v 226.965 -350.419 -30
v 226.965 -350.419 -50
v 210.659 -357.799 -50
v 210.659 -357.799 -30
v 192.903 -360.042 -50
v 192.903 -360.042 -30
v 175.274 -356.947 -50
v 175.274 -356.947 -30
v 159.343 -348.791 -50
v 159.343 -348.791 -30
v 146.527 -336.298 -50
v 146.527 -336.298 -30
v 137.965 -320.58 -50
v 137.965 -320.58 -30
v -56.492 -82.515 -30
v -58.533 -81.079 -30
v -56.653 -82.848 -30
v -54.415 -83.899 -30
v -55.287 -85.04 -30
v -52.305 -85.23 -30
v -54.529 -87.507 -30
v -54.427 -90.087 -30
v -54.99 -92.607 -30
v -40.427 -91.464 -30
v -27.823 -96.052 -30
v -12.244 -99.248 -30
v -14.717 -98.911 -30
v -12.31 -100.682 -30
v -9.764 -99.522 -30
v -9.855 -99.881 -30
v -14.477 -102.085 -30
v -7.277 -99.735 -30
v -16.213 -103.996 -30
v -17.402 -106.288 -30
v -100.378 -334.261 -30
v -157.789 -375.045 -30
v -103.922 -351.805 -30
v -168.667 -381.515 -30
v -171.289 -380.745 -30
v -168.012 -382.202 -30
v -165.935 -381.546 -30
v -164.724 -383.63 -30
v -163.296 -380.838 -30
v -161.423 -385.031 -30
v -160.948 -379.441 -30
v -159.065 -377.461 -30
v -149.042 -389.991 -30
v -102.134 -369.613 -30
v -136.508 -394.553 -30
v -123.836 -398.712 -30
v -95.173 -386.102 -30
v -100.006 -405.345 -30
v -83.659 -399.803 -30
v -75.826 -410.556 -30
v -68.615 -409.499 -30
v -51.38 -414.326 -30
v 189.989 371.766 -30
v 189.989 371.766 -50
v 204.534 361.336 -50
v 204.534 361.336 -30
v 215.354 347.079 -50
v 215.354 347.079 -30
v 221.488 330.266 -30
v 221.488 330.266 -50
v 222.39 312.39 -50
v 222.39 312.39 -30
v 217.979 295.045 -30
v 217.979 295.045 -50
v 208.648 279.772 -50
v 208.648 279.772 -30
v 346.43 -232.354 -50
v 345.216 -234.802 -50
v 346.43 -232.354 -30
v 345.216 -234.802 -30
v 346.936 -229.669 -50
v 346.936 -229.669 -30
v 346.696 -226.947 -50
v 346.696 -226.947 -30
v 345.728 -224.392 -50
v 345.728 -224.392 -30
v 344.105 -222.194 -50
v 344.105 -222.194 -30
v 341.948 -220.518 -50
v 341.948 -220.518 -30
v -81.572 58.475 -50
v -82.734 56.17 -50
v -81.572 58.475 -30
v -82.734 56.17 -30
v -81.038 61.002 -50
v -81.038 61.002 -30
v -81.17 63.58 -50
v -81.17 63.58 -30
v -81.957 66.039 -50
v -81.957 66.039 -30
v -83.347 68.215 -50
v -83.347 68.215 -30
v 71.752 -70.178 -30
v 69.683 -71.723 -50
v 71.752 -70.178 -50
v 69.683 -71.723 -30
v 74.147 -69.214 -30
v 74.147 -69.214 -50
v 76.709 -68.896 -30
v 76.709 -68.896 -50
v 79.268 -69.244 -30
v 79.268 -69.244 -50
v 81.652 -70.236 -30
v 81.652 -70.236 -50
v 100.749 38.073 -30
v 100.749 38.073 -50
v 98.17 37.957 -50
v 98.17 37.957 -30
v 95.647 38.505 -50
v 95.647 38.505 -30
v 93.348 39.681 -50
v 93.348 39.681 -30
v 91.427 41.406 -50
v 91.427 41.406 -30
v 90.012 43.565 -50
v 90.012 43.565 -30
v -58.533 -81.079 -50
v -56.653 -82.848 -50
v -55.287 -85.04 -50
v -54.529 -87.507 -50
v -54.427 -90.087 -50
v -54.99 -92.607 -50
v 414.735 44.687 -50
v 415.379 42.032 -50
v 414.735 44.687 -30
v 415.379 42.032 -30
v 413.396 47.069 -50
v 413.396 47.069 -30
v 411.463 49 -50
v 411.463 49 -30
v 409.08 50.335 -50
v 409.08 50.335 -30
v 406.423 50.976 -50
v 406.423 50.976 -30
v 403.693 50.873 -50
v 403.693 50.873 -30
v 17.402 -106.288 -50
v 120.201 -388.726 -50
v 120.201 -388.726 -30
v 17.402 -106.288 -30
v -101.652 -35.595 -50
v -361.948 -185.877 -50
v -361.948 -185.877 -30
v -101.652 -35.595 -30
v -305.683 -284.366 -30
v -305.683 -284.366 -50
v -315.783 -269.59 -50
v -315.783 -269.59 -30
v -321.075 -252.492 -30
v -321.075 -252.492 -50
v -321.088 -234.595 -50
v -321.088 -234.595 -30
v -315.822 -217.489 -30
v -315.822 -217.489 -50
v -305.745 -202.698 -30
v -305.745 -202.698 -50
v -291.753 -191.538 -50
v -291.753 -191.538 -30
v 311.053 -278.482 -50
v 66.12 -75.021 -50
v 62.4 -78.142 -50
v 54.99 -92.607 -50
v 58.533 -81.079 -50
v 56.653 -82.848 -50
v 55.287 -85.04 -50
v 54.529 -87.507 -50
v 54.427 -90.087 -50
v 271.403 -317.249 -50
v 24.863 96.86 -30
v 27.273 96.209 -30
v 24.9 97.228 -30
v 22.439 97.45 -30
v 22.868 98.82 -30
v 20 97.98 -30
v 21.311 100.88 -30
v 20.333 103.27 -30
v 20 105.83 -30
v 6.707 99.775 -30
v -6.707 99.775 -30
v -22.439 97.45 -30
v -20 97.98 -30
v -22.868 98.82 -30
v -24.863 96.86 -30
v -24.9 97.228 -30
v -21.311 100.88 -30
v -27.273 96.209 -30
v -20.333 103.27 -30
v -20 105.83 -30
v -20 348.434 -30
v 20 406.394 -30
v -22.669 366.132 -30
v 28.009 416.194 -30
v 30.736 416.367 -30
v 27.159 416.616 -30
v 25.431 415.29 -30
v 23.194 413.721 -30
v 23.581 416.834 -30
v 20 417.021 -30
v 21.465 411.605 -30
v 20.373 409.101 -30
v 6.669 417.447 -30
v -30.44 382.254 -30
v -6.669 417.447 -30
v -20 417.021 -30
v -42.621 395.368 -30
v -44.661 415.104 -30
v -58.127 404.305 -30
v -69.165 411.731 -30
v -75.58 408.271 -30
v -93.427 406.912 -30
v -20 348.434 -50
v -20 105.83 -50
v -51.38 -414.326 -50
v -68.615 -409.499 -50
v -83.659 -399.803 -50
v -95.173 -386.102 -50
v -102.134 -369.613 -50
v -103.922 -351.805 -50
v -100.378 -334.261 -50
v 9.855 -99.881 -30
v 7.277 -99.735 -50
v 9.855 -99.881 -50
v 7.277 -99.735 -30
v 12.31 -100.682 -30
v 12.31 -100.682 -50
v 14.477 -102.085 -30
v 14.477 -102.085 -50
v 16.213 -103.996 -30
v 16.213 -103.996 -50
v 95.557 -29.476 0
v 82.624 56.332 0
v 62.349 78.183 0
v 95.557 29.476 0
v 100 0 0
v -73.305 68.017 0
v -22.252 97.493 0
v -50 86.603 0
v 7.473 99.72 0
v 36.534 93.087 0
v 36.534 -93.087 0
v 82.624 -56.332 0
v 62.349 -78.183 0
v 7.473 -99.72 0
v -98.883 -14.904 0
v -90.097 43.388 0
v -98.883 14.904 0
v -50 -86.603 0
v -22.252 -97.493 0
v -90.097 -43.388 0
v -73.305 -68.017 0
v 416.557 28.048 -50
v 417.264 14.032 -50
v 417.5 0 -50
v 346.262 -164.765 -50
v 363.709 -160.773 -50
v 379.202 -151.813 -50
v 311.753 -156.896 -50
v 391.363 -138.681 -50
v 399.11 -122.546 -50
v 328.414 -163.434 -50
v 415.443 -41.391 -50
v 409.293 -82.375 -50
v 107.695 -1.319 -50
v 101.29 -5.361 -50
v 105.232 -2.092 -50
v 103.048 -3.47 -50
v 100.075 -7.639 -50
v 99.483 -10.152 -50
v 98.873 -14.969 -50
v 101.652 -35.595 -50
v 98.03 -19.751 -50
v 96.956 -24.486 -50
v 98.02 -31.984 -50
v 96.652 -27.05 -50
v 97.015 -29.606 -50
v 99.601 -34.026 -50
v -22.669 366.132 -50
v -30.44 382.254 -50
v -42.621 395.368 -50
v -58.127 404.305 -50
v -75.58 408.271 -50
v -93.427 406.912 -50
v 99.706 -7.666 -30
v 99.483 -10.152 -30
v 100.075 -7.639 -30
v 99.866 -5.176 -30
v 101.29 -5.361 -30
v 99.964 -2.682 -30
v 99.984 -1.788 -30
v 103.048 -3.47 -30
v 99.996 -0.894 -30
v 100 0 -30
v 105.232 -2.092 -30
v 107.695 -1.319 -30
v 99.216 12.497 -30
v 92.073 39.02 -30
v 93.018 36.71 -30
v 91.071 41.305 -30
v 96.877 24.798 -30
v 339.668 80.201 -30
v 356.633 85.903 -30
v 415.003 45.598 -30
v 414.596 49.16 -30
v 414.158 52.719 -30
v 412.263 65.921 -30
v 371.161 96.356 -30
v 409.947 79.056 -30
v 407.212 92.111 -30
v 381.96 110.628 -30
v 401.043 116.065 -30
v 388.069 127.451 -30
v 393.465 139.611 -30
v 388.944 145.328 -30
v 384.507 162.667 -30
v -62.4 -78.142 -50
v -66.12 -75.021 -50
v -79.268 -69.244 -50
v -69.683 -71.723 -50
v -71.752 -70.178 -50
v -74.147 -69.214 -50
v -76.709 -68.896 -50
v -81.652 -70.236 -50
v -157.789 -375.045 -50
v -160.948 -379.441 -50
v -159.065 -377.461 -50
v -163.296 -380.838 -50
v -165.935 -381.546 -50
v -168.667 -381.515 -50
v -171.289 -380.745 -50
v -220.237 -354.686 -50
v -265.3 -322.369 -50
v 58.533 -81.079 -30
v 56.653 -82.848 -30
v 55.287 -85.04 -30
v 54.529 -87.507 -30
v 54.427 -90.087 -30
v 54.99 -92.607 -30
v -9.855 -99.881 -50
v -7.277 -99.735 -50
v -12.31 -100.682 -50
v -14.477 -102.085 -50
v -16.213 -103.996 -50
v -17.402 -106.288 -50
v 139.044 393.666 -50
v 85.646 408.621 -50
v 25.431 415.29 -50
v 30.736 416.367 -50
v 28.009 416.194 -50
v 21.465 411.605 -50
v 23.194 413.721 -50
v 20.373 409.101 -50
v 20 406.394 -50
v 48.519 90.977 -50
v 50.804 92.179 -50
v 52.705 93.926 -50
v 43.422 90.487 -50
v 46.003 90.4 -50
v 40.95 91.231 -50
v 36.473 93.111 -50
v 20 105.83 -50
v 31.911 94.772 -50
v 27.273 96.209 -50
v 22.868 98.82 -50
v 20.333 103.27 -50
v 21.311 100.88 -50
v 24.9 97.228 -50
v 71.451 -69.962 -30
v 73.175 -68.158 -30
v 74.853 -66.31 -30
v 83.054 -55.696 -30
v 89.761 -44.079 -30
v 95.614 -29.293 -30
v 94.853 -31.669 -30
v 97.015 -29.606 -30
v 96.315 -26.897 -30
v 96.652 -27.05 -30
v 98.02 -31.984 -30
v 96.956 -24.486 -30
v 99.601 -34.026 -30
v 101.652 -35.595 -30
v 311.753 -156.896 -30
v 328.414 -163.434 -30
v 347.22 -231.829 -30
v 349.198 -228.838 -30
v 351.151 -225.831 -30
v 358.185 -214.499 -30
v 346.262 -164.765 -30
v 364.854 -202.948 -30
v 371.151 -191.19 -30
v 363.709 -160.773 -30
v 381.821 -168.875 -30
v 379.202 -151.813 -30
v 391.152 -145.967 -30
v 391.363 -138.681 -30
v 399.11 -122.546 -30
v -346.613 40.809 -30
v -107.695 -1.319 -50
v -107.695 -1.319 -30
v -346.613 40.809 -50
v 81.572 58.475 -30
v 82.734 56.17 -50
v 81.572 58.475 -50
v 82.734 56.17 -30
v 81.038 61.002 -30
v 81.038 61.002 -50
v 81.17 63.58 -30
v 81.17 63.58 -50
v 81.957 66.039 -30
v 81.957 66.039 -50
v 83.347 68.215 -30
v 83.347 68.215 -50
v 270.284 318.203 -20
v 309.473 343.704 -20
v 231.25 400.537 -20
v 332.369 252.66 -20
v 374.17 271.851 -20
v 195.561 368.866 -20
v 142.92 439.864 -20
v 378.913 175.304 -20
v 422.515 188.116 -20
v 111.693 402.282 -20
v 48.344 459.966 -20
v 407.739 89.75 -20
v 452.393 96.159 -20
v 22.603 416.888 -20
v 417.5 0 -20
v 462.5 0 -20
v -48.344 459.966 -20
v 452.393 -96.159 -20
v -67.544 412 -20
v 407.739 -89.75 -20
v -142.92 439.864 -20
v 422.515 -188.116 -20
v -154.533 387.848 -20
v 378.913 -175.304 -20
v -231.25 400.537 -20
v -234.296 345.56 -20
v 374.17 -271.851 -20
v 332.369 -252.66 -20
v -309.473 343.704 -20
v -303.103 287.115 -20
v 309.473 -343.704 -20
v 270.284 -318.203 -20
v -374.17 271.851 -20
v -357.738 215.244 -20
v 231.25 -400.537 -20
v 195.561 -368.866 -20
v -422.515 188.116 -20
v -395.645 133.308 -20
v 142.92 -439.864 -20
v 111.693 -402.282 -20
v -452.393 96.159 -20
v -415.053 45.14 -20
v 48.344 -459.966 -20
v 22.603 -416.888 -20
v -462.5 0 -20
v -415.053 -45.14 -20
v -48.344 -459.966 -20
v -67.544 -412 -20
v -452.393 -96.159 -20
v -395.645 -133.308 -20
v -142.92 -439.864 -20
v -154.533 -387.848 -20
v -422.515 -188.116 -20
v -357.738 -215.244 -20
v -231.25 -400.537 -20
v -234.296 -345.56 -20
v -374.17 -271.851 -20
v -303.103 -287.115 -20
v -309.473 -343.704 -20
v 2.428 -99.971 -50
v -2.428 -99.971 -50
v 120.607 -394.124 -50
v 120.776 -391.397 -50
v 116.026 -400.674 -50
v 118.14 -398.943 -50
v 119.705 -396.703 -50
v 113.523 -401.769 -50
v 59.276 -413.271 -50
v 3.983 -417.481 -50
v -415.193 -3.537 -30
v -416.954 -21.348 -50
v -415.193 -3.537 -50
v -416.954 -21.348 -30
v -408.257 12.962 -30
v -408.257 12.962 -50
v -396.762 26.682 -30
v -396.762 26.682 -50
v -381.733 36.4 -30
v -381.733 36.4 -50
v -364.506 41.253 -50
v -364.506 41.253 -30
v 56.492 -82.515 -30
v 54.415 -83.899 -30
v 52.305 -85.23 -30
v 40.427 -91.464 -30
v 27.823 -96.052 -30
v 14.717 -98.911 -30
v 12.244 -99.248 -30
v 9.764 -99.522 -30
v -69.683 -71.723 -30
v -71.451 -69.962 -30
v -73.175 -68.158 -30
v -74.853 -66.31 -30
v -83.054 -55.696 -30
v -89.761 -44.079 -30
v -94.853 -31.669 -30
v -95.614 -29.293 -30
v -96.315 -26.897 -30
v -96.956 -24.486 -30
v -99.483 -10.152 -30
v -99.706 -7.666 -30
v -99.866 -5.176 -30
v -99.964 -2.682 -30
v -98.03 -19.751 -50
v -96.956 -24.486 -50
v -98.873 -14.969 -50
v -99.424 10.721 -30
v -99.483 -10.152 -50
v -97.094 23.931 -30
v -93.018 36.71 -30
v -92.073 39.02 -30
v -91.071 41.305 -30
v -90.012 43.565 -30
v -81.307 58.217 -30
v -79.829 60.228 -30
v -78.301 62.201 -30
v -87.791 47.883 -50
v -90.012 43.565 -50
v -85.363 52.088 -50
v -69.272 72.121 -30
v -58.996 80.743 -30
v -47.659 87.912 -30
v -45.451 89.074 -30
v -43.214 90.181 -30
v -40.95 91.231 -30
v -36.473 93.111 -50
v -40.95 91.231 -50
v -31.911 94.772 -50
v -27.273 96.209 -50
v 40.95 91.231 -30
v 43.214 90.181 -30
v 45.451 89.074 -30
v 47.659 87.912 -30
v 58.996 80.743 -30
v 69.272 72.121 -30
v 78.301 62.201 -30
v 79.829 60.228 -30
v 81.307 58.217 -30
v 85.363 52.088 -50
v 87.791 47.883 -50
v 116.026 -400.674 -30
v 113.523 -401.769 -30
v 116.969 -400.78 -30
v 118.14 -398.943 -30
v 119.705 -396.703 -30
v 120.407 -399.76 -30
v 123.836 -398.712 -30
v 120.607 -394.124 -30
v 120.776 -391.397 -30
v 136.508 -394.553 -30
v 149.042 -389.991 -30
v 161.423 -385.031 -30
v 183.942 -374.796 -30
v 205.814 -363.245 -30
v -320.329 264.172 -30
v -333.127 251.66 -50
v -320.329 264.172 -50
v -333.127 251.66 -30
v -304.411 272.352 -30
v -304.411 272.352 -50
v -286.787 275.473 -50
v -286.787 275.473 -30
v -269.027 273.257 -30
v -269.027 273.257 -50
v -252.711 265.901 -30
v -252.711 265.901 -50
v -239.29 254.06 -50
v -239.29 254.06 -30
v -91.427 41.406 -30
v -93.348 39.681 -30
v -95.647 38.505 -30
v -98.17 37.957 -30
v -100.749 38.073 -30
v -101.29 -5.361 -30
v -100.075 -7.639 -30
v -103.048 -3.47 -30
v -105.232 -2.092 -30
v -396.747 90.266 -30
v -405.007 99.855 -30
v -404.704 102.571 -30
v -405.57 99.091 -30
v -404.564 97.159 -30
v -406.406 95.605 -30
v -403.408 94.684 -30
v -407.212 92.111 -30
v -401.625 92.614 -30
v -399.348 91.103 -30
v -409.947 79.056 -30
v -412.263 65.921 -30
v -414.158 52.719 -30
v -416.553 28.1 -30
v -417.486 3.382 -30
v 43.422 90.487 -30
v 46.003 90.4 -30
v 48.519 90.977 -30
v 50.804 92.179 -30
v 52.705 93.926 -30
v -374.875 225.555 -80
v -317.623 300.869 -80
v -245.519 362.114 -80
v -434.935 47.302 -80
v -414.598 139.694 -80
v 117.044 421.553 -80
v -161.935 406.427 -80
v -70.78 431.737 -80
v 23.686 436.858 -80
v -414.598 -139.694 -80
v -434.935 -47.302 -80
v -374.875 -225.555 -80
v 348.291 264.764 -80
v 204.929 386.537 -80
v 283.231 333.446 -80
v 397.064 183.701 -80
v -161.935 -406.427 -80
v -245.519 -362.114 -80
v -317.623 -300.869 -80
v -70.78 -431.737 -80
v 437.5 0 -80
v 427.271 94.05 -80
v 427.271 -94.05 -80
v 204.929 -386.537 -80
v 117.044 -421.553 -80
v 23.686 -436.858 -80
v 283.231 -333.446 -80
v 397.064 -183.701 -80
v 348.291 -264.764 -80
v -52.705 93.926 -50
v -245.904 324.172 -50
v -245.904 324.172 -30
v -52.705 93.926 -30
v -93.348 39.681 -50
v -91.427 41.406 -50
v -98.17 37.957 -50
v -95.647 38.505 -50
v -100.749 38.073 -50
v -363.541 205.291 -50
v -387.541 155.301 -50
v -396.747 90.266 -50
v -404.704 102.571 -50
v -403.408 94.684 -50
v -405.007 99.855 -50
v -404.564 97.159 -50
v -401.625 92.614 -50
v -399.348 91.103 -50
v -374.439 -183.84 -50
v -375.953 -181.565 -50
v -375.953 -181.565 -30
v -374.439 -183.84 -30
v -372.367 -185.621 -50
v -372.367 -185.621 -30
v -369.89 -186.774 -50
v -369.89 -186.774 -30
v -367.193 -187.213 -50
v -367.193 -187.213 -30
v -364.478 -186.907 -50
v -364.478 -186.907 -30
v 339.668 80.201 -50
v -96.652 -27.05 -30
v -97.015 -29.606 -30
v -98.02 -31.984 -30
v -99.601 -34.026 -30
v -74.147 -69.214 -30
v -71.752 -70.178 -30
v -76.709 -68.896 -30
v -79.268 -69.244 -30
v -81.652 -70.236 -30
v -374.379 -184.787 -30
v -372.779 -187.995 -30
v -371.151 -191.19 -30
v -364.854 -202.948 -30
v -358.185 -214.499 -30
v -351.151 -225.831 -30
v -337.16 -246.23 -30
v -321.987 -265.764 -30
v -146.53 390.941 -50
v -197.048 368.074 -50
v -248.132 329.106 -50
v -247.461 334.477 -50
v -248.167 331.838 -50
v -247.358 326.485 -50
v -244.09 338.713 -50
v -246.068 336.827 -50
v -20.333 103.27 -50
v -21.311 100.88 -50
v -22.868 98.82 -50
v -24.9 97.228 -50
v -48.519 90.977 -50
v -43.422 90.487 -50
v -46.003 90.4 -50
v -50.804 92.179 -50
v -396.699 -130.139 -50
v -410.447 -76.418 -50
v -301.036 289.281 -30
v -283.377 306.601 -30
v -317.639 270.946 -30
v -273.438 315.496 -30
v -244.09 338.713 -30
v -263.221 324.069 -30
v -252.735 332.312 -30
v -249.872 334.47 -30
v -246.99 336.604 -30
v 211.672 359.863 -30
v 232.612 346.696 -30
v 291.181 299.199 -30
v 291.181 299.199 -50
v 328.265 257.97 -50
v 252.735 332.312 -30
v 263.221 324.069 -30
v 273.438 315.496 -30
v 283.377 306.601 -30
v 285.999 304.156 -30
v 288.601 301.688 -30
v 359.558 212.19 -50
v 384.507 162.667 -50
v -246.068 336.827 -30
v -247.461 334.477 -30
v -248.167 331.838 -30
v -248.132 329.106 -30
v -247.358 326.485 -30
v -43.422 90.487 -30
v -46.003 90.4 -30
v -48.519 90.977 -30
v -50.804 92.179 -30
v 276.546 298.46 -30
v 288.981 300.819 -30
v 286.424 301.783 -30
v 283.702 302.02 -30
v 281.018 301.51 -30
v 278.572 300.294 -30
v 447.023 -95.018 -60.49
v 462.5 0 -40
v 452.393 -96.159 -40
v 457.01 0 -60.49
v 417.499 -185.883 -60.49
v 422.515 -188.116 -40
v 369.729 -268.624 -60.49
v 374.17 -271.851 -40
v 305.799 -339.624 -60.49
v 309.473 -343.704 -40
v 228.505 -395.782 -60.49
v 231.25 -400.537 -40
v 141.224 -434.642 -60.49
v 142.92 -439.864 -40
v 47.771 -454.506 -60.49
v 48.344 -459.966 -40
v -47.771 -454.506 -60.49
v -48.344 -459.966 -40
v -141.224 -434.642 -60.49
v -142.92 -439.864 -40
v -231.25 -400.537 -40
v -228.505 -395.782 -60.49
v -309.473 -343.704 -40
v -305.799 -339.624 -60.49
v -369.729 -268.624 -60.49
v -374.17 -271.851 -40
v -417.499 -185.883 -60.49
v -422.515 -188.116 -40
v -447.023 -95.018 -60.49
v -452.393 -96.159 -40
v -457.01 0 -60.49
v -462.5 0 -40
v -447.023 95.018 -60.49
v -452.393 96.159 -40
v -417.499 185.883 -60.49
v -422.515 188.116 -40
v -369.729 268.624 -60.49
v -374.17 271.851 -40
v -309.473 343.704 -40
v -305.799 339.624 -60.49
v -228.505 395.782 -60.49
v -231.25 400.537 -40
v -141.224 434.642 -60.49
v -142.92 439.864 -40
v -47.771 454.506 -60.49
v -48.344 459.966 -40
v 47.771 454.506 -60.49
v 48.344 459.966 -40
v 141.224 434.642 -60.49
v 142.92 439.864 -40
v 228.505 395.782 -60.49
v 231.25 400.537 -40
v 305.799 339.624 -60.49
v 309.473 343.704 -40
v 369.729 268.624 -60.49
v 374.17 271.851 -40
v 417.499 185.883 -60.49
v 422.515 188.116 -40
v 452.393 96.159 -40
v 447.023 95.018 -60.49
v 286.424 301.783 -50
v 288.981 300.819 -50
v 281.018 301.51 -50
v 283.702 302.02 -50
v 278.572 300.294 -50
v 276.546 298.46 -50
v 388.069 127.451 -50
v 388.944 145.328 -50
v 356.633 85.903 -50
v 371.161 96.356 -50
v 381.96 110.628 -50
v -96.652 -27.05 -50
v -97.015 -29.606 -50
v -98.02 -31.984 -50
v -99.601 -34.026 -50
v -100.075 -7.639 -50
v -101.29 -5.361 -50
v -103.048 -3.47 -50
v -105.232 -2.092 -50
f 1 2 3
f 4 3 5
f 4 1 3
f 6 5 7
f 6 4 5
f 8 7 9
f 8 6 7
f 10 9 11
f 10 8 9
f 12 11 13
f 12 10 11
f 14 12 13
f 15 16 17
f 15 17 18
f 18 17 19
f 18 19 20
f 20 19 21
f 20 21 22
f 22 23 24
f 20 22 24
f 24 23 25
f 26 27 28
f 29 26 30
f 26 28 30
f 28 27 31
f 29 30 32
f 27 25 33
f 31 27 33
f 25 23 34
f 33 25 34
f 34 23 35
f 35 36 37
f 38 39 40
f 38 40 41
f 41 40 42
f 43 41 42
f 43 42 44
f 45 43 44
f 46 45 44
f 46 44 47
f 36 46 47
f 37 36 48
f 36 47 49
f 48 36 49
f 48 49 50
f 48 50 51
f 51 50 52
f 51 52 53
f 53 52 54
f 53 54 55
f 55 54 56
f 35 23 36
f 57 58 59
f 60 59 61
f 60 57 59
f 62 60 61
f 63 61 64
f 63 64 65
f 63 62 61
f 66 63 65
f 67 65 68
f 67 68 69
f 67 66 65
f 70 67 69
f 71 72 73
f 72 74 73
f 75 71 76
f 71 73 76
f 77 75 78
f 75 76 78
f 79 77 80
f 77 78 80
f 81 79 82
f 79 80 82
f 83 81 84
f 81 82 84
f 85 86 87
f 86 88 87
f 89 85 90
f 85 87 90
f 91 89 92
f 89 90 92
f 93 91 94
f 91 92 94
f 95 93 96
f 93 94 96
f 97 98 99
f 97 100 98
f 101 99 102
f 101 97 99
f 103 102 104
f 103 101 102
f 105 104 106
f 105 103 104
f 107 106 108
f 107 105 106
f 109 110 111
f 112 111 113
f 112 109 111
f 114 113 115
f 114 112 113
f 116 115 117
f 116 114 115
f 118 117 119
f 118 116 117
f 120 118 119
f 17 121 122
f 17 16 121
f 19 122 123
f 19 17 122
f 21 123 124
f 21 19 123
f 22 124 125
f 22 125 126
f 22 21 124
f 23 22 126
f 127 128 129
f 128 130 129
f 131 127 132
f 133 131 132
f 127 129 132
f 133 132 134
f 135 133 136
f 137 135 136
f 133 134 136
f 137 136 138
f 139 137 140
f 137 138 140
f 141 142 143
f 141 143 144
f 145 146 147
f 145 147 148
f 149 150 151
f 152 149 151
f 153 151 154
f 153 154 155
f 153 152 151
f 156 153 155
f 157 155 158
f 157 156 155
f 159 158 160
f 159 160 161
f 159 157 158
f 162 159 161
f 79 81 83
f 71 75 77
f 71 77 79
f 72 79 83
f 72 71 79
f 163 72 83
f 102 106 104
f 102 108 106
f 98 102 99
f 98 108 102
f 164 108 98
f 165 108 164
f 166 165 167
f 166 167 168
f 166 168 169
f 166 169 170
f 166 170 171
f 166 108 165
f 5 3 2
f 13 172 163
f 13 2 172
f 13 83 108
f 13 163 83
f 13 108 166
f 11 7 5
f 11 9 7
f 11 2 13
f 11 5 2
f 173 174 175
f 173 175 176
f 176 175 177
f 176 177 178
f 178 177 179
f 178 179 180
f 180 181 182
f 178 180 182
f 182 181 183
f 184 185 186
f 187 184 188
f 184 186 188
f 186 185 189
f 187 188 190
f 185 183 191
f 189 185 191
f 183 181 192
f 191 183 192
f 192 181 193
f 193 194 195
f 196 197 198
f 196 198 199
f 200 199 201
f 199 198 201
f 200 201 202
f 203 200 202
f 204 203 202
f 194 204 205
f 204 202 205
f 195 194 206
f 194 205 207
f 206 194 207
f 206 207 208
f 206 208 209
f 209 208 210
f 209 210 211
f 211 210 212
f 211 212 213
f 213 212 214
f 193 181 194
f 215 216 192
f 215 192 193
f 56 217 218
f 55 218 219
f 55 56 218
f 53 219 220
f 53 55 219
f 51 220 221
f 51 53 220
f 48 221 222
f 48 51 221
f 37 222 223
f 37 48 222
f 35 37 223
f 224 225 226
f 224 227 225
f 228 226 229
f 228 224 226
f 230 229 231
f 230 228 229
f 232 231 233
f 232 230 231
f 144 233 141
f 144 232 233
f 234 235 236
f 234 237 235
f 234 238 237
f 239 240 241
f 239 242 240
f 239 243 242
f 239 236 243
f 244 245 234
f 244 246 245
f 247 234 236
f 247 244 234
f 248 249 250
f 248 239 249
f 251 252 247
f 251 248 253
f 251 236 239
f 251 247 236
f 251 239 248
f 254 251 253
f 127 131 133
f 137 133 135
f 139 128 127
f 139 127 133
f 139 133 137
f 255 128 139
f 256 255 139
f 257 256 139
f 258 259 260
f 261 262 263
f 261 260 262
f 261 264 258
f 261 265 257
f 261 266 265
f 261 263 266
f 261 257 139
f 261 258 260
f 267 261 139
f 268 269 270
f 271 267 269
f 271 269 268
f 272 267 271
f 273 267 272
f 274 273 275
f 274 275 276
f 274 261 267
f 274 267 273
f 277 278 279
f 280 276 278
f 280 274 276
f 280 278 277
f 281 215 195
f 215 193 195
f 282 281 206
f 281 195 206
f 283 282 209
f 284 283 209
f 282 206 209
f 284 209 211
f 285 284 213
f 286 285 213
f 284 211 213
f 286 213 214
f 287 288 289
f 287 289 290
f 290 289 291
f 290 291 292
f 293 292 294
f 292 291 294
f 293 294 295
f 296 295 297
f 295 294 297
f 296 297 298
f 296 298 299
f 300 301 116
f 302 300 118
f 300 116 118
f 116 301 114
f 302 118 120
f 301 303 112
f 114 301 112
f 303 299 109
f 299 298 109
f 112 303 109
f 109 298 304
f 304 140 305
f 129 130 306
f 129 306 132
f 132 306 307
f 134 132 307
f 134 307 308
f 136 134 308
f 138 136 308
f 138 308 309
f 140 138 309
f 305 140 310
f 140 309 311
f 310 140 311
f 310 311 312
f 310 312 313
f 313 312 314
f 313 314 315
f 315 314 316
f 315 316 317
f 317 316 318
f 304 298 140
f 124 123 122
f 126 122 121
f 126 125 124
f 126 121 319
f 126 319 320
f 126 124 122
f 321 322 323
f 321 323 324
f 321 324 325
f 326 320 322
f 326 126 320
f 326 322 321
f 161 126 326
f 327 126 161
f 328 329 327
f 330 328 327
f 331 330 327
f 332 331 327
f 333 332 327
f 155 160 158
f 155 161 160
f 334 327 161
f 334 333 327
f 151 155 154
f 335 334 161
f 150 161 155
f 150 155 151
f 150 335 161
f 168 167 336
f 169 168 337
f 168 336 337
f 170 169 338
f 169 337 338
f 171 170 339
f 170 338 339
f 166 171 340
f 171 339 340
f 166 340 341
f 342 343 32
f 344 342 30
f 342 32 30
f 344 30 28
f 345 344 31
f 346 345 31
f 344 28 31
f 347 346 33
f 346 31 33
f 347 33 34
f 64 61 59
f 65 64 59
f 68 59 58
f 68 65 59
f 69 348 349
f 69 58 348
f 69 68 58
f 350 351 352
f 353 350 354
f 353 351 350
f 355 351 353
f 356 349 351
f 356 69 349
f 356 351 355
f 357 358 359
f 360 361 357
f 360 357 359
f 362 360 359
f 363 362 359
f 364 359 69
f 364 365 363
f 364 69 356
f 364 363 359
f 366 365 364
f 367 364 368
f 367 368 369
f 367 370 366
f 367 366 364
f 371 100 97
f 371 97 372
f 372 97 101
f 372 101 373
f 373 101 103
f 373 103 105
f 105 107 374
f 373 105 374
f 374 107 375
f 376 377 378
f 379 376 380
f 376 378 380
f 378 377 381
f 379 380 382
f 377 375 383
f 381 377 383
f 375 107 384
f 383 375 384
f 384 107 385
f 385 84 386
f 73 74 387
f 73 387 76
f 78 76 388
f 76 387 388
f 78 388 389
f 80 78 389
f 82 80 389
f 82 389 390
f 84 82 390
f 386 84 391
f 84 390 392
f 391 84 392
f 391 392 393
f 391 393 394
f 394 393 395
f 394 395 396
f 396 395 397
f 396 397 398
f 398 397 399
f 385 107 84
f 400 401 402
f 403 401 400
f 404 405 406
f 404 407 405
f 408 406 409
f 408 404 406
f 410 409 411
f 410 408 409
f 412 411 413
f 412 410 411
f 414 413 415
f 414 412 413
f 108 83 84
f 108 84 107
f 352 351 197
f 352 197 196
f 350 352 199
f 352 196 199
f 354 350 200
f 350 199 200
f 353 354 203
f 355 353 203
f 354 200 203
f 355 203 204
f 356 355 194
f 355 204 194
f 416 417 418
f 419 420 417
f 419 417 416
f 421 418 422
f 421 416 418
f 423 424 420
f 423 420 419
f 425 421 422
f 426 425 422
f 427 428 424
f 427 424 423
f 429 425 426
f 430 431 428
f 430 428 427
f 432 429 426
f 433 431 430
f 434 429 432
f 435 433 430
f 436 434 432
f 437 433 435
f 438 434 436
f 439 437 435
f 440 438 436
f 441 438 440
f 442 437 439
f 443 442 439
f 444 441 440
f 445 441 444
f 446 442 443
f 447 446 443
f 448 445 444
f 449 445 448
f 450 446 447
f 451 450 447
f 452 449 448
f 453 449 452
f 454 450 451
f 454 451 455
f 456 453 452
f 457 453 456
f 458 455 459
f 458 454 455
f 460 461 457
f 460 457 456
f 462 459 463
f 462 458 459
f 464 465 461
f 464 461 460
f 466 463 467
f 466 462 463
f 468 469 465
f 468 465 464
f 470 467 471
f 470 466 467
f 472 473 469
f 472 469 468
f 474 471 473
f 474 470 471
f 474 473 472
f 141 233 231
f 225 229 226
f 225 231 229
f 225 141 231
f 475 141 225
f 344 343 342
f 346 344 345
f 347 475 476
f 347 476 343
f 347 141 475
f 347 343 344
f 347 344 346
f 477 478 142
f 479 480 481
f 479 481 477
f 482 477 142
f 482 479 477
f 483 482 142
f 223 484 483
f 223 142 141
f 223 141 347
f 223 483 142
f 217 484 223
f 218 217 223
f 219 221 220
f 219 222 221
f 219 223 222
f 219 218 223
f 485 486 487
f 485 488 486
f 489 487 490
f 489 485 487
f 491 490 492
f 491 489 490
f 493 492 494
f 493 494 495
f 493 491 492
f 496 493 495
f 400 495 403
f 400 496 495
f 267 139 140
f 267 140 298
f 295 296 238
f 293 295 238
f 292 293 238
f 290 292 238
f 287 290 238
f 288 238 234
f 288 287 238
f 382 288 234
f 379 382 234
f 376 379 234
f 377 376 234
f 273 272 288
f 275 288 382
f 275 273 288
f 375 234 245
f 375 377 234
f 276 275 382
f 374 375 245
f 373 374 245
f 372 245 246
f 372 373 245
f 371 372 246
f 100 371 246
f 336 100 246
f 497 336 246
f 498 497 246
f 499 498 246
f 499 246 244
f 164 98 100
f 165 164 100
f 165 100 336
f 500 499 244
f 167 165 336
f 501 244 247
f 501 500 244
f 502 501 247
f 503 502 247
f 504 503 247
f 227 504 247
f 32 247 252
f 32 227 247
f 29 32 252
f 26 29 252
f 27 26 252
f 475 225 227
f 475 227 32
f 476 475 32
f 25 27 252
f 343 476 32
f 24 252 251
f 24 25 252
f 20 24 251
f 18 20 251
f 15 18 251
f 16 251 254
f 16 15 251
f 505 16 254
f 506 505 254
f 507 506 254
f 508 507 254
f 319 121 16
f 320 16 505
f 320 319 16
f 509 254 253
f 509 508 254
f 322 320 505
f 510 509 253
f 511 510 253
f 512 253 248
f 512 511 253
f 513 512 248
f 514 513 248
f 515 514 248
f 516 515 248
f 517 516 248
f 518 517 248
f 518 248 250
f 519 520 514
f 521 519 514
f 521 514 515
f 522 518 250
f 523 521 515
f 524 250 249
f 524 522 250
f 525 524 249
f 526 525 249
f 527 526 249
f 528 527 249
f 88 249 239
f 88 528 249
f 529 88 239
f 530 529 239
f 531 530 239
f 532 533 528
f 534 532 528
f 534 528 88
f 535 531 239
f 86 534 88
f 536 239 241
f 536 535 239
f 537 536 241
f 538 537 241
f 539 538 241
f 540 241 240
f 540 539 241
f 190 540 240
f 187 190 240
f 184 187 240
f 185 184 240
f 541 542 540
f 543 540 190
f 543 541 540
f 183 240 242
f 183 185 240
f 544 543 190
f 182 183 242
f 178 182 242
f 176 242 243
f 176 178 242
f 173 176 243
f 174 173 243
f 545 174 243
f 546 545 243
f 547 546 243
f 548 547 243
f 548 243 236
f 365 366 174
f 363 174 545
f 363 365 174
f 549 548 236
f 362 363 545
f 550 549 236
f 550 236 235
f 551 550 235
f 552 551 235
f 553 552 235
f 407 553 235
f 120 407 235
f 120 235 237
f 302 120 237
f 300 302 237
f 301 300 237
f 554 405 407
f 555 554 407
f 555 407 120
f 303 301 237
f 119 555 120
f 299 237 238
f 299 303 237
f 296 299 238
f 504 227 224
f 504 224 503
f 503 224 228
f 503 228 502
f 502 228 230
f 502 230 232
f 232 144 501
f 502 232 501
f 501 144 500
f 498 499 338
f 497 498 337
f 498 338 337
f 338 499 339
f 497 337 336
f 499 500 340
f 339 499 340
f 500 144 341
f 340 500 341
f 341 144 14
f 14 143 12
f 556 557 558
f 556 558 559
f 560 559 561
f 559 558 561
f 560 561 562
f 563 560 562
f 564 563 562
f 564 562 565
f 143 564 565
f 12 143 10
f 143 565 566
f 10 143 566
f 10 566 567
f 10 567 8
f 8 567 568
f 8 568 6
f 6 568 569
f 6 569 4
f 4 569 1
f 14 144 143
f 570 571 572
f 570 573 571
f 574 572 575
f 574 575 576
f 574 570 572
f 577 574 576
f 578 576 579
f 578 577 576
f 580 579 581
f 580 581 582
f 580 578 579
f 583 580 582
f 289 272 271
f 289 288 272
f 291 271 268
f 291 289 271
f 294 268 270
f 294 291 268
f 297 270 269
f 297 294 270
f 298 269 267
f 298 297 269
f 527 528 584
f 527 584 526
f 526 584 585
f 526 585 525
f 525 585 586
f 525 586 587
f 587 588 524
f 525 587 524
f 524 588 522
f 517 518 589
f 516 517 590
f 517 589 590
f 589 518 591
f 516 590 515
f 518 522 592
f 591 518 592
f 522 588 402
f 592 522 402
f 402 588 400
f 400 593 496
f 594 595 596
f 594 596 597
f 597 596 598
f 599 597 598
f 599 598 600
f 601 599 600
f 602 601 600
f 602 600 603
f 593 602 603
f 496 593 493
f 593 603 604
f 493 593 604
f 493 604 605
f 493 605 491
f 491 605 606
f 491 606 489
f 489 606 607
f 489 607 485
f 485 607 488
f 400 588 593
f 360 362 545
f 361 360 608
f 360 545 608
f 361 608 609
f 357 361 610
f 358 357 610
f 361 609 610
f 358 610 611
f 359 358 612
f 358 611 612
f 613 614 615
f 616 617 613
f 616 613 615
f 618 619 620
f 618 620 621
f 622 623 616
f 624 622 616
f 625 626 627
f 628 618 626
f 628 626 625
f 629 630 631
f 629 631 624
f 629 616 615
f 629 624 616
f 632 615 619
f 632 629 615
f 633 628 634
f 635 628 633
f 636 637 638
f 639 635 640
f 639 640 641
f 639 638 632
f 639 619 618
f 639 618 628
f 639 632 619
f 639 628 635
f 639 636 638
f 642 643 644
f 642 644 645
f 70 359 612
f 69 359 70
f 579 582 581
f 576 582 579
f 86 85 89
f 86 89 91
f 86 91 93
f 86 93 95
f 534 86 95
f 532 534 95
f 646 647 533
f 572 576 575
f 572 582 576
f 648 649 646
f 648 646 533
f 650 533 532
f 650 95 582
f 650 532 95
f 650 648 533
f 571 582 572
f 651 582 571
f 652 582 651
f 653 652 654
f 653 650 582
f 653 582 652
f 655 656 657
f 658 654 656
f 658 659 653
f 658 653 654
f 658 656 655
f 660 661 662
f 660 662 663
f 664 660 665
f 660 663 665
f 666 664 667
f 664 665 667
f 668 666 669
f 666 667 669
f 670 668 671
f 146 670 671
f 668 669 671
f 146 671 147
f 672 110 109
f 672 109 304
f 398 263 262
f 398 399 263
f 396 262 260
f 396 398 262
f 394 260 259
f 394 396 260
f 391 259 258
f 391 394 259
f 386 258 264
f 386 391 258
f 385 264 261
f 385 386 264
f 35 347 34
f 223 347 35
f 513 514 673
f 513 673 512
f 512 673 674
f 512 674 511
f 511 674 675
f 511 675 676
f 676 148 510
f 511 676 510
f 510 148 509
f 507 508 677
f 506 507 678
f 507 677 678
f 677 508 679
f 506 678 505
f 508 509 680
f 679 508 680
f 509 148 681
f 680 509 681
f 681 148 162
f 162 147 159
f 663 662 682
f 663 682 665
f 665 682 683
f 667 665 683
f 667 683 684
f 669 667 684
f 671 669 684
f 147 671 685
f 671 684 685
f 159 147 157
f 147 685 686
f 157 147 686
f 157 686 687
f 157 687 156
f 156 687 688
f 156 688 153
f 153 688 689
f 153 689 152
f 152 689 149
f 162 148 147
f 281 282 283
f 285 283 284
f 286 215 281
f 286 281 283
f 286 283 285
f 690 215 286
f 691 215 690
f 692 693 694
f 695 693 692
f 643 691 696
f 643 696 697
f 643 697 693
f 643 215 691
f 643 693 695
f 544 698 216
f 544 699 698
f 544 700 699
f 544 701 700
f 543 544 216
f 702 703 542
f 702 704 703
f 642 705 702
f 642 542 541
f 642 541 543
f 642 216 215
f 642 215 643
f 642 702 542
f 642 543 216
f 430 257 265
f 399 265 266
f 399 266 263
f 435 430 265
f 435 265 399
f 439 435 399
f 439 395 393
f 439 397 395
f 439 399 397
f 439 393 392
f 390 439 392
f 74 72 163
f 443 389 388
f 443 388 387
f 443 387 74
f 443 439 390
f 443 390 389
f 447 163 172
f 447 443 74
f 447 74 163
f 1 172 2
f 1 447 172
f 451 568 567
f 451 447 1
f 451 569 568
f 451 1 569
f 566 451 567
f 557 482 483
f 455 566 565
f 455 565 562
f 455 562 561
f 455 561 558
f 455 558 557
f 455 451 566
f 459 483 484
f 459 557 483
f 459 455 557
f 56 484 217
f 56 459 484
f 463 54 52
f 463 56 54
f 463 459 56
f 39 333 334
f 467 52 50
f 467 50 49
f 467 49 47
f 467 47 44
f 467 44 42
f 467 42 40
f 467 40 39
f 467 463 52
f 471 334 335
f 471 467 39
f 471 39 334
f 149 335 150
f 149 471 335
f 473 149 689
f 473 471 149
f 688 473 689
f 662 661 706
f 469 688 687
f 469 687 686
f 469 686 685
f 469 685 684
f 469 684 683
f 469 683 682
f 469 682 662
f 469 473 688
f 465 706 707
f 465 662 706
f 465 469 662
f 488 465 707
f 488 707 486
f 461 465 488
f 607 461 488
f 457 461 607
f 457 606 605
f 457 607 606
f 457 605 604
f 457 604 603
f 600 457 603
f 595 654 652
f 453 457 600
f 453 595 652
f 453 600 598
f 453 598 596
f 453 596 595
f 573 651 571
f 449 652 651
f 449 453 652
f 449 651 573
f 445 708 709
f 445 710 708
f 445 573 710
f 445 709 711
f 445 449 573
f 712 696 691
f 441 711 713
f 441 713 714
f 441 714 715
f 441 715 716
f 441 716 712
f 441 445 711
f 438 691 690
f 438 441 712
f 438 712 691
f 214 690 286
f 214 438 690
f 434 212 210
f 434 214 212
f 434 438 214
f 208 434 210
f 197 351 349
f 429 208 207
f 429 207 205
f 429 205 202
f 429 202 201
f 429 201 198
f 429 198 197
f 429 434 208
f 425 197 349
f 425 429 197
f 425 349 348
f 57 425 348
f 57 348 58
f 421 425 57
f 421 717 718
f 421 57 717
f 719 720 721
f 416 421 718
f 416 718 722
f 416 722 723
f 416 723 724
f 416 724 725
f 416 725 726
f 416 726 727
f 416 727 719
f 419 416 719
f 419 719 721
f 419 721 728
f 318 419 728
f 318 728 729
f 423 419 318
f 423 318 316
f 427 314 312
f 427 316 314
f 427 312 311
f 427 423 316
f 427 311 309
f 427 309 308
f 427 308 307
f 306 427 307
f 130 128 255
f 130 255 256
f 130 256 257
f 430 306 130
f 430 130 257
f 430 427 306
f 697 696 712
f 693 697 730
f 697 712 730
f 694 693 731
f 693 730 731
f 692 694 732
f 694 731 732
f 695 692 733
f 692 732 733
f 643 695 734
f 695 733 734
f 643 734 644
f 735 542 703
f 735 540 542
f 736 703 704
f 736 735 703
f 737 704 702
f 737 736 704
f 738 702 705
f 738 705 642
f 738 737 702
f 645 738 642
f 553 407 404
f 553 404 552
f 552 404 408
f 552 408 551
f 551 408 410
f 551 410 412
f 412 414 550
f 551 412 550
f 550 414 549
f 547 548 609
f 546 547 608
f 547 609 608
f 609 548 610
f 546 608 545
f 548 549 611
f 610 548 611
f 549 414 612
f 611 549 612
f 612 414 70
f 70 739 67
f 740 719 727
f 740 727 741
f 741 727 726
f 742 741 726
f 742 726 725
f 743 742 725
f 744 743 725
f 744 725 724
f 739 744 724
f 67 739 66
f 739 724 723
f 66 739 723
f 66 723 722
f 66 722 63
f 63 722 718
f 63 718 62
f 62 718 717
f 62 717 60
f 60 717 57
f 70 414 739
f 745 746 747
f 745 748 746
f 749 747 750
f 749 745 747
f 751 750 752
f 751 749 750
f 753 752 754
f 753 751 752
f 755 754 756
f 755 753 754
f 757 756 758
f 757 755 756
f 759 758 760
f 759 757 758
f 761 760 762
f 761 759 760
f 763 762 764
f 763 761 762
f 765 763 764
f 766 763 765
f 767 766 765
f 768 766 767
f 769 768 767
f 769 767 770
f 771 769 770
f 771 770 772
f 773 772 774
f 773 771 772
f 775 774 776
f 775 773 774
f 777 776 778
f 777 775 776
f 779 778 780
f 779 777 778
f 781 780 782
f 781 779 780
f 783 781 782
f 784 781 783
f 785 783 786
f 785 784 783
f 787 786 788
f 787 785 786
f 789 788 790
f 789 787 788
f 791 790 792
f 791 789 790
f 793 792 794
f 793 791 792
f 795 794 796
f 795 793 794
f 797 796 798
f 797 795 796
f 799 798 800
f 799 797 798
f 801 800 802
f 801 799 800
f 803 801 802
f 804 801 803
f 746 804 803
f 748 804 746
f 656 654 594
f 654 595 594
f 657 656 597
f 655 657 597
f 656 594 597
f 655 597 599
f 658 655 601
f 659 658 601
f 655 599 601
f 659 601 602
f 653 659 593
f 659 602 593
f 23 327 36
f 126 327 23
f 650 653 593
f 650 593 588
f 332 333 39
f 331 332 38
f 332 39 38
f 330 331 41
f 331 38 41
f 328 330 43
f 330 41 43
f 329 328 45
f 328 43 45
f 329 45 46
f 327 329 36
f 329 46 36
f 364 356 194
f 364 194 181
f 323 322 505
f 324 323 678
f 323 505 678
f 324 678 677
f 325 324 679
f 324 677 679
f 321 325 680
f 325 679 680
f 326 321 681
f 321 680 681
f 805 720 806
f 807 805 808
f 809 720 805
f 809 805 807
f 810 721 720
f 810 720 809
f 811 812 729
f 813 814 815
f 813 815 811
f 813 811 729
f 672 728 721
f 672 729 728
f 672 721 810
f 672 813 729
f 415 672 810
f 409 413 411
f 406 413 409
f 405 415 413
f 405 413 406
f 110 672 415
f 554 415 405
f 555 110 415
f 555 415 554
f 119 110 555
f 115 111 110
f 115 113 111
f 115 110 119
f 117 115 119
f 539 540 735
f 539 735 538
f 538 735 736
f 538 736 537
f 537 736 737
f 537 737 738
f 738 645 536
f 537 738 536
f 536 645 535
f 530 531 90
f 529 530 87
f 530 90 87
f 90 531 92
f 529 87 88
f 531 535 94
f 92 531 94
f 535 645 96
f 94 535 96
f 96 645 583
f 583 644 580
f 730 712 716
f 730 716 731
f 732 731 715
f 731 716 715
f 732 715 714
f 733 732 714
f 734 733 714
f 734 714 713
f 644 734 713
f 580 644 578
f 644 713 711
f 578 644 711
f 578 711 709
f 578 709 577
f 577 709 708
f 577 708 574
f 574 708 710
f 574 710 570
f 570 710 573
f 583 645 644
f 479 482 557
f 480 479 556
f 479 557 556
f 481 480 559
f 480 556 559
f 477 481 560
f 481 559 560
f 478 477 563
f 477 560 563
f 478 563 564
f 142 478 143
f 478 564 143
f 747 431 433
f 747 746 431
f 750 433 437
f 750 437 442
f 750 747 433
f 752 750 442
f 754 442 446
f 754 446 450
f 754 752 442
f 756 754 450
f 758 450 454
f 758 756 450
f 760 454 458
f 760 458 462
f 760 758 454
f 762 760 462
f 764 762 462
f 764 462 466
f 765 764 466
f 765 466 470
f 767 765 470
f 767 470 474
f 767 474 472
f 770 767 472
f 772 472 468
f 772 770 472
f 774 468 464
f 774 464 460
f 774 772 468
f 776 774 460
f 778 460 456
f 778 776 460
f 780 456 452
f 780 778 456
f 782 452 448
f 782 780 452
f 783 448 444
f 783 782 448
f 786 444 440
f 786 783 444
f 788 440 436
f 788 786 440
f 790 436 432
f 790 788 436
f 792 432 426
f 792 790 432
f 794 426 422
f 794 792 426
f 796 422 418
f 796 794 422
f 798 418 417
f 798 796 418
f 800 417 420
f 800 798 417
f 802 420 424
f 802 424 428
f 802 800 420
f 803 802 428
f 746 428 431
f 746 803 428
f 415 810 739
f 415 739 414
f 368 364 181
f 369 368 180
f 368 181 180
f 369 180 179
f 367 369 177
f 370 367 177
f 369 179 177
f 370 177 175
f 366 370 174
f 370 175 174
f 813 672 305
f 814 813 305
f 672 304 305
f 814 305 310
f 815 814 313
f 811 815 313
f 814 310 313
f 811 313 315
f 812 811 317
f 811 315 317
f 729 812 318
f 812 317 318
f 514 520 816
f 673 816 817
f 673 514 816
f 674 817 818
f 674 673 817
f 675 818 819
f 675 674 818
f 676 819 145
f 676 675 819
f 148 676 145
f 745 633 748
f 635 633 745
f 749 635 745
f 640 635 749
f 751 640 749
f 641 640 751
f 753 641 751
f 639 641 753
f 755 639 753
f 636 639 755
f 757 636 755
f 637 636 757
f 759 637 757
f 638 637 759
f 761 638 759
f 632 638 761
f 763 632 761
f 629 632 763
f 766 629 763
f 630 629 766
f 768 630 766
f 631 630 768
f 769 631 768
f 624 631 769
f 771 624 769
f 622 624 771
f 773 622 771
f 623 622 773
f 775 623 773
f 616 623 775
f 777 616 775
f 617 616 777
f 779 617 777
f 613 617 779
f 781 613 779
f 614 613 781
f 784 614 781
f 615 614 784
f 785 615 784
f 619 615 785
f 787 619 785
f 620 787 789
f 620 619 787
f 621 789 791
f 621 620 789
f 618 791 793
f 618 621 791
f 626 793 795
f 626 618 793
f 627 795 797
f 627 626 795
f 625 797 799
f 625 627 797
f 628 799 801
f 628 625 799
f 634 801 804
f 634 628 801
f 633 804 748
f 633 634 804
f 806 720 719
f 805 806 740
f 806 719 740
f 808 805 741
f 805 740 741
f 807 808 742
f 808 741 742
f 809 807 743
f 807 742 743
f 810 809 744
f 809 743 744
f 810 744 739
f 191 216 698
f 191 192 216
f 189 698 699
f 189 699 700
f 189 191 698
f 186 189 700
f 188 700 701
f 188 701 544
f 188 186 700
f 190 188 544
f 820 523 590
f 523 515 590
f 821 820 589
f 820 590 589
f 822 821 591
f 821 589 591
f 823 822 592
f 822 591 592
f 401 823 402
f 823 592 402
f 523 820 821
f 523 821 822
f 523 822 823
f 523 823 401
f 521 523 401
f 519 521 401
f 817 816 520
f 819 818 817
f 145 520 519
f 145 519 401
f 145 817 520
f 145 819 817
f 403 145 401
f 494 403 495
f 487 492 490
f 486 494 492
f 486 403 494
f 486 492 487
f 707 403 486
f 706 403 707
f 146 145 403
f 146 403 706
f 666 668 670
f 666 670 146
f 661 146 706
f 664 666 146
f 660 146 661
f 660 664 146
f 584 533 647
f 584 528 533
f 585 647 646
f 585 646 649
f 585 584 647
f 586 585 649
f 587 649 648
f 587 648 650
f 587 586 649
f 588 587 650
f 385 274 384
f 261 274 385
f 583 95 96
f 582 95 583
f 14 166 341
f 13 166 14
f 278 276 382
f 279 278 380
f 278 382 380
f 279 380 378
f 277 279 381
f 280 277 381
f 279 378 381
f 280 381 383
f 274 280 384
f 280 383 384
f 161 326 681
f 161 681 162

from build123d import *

# Parameters (mm, degrees)
BOSS_EXTRUDE1_DEPTH      = 20
FILLET1_R                = 60
FILLET2_R                = 10
CIRPATTERN1_COUNT        = 9
FILLET1_OF_CIRPATTERN1_R = 60
FILLET2_OF_CIRPATTERN1_R = 10


with BuildPart() as part:
    # Sketch1 → Revolve1 (revolve)
    with BuildSketch(Plane(origin=(0, 0, 0), x_dir=(0, 0, -1), z_dir=(1, 0, 0)), mode=Mode.PRIVATE) as revolve1_sk:
        Polygon((0, 0), (0, 100), (50, 100), (50, 417.5), (20, 417.5), (20, 462.5), (40, 462.5), (60.490381057, 457.009618943), (80, 437.5), (80, 0), align=None)
    revolve(revolve1_sk.sketch.rotate(Axis((0, 0, 404.979253112), (0, 0, -1)), 90), axis=Axis((0, 0, 404.979253112), (0, 0, -1)))

    # Sketch2 → Boss-Extrude1 (add)
    with BuildSketch(Plane.XY.offset(-50)):
        with BuildLine():
            Line((-20, 97.979589711), (-20, 417.02068294))
            ThreePointArc((-20, 417.02068294), (0, 417.5), (20, 417.02068294))
            Line((20, 417.02068294), (20, 97.979589711))
            ThreePointArc((20, 97.979589711), (0, 100), (-20, 97.979589711))
        make_face()
    boss_extrude1 = extrude(amount=BOSS_EXTRUDE1_DEPTH)

    # Fillet1
    fillet1_edges = [part.edges().sort_by_distance(p)[0] for p in [
        (-20, 417.02068294, -40),
    ]]
    fillet(fillet1_edges, radius=FILLET1_R)

    # Fillet2
    fillet2_edges = [part.edges().sort_by_distance(p)[0] for p in [
        (20, 417.02068294, -40),
        (20, 97.979589711, -40),
        (-20, 97.979589711, -40),
    ]]
    fillet(fillet2_edges, radius=FILLET2_R)

    # CirPattern1: Boss-Extrude1 ×9 about axis
    cirpattern1_axis = Axis((0, 0, 0), (0, 0, 1))
    for i in range(1, CIRPATTERN1_COUNT):
        add(boss_extrude1.rotate(cirpattern1_axis, i * 360 / CIRPATTERN1_COUNT))

    # Fillet1 of CirPattern1
    fillet1_of_cirpattern1_edges = [part.edges().sort_by_distance(p)[0] for p in [
        (-283.376616839, 306.600624638, -40),
        (-414.158165279, 52.718726582, -40),
        (-351.15050533, -225.830849546, -40),
        (-123.835621333, -398.711661341, -40),
        (161.423326165, -385.030855608, -40),
        (371.15050533, -191.189833394, -40),
        (407.212238173, 92.111036702, -40),
        (252.734839115, 332.312129026, -40),
    ]]
    fillet(fillet1_of_cirpattern1_edges, radius=FILLET1_OF_CIRPATTERN1_R)

    # Fillet2 of CirPattern1
    fillet2_of_cirpattern1_edges = [part.edges().sort_by_distance(p)[0] for p in [
        (-252.734839115, 332.312129026, -40),
        (-47.659177406, 87.912472431, -40),
        (-78.300955131, 62.200968044, -40),
        (-407.212238173, 92.111036702, -40),
        (-93.018096031, 36.710132262, -40),
        (-99.964023138, -2.682177858, -40),
        (-371.15050533, -191.189833394, -40),
        (-94.852813742, -31.66928678, -40),
        (-74.852813742, -66.310302931, -40),
        (-161.423326165, -385.030855608, -40),
        (-52.304845732, -85.230294573, -40),
        (-14.7171409, -98.911100306, -40),
        (123.835621333, -398.711661341, -40),
        (14.7171409, -98.911100306, -40),
        (52.304845732, -85.230294573, -40),
        (351.15050533, -225.830849546, -40),
        (74.852813742, -66.310302931, -40),
        (94.852813742, -31.66928678, -40),
        (414.158165279, 52.718726582, -40),
        (99.964023138, -2.682177858, -40),
        (93.018096031, 36.710132262, -40),
        (283.376616839, 306.600624638, -40),
        (78.300955131, 62.200968044, -40),
        (47.659177406, 87.912472431, -40),
    ]]
    fillet(fillet2_of_cirpattern1_edges, radius=FILLET2_OF_CIRPATTERN1_R)


solid = part.part
